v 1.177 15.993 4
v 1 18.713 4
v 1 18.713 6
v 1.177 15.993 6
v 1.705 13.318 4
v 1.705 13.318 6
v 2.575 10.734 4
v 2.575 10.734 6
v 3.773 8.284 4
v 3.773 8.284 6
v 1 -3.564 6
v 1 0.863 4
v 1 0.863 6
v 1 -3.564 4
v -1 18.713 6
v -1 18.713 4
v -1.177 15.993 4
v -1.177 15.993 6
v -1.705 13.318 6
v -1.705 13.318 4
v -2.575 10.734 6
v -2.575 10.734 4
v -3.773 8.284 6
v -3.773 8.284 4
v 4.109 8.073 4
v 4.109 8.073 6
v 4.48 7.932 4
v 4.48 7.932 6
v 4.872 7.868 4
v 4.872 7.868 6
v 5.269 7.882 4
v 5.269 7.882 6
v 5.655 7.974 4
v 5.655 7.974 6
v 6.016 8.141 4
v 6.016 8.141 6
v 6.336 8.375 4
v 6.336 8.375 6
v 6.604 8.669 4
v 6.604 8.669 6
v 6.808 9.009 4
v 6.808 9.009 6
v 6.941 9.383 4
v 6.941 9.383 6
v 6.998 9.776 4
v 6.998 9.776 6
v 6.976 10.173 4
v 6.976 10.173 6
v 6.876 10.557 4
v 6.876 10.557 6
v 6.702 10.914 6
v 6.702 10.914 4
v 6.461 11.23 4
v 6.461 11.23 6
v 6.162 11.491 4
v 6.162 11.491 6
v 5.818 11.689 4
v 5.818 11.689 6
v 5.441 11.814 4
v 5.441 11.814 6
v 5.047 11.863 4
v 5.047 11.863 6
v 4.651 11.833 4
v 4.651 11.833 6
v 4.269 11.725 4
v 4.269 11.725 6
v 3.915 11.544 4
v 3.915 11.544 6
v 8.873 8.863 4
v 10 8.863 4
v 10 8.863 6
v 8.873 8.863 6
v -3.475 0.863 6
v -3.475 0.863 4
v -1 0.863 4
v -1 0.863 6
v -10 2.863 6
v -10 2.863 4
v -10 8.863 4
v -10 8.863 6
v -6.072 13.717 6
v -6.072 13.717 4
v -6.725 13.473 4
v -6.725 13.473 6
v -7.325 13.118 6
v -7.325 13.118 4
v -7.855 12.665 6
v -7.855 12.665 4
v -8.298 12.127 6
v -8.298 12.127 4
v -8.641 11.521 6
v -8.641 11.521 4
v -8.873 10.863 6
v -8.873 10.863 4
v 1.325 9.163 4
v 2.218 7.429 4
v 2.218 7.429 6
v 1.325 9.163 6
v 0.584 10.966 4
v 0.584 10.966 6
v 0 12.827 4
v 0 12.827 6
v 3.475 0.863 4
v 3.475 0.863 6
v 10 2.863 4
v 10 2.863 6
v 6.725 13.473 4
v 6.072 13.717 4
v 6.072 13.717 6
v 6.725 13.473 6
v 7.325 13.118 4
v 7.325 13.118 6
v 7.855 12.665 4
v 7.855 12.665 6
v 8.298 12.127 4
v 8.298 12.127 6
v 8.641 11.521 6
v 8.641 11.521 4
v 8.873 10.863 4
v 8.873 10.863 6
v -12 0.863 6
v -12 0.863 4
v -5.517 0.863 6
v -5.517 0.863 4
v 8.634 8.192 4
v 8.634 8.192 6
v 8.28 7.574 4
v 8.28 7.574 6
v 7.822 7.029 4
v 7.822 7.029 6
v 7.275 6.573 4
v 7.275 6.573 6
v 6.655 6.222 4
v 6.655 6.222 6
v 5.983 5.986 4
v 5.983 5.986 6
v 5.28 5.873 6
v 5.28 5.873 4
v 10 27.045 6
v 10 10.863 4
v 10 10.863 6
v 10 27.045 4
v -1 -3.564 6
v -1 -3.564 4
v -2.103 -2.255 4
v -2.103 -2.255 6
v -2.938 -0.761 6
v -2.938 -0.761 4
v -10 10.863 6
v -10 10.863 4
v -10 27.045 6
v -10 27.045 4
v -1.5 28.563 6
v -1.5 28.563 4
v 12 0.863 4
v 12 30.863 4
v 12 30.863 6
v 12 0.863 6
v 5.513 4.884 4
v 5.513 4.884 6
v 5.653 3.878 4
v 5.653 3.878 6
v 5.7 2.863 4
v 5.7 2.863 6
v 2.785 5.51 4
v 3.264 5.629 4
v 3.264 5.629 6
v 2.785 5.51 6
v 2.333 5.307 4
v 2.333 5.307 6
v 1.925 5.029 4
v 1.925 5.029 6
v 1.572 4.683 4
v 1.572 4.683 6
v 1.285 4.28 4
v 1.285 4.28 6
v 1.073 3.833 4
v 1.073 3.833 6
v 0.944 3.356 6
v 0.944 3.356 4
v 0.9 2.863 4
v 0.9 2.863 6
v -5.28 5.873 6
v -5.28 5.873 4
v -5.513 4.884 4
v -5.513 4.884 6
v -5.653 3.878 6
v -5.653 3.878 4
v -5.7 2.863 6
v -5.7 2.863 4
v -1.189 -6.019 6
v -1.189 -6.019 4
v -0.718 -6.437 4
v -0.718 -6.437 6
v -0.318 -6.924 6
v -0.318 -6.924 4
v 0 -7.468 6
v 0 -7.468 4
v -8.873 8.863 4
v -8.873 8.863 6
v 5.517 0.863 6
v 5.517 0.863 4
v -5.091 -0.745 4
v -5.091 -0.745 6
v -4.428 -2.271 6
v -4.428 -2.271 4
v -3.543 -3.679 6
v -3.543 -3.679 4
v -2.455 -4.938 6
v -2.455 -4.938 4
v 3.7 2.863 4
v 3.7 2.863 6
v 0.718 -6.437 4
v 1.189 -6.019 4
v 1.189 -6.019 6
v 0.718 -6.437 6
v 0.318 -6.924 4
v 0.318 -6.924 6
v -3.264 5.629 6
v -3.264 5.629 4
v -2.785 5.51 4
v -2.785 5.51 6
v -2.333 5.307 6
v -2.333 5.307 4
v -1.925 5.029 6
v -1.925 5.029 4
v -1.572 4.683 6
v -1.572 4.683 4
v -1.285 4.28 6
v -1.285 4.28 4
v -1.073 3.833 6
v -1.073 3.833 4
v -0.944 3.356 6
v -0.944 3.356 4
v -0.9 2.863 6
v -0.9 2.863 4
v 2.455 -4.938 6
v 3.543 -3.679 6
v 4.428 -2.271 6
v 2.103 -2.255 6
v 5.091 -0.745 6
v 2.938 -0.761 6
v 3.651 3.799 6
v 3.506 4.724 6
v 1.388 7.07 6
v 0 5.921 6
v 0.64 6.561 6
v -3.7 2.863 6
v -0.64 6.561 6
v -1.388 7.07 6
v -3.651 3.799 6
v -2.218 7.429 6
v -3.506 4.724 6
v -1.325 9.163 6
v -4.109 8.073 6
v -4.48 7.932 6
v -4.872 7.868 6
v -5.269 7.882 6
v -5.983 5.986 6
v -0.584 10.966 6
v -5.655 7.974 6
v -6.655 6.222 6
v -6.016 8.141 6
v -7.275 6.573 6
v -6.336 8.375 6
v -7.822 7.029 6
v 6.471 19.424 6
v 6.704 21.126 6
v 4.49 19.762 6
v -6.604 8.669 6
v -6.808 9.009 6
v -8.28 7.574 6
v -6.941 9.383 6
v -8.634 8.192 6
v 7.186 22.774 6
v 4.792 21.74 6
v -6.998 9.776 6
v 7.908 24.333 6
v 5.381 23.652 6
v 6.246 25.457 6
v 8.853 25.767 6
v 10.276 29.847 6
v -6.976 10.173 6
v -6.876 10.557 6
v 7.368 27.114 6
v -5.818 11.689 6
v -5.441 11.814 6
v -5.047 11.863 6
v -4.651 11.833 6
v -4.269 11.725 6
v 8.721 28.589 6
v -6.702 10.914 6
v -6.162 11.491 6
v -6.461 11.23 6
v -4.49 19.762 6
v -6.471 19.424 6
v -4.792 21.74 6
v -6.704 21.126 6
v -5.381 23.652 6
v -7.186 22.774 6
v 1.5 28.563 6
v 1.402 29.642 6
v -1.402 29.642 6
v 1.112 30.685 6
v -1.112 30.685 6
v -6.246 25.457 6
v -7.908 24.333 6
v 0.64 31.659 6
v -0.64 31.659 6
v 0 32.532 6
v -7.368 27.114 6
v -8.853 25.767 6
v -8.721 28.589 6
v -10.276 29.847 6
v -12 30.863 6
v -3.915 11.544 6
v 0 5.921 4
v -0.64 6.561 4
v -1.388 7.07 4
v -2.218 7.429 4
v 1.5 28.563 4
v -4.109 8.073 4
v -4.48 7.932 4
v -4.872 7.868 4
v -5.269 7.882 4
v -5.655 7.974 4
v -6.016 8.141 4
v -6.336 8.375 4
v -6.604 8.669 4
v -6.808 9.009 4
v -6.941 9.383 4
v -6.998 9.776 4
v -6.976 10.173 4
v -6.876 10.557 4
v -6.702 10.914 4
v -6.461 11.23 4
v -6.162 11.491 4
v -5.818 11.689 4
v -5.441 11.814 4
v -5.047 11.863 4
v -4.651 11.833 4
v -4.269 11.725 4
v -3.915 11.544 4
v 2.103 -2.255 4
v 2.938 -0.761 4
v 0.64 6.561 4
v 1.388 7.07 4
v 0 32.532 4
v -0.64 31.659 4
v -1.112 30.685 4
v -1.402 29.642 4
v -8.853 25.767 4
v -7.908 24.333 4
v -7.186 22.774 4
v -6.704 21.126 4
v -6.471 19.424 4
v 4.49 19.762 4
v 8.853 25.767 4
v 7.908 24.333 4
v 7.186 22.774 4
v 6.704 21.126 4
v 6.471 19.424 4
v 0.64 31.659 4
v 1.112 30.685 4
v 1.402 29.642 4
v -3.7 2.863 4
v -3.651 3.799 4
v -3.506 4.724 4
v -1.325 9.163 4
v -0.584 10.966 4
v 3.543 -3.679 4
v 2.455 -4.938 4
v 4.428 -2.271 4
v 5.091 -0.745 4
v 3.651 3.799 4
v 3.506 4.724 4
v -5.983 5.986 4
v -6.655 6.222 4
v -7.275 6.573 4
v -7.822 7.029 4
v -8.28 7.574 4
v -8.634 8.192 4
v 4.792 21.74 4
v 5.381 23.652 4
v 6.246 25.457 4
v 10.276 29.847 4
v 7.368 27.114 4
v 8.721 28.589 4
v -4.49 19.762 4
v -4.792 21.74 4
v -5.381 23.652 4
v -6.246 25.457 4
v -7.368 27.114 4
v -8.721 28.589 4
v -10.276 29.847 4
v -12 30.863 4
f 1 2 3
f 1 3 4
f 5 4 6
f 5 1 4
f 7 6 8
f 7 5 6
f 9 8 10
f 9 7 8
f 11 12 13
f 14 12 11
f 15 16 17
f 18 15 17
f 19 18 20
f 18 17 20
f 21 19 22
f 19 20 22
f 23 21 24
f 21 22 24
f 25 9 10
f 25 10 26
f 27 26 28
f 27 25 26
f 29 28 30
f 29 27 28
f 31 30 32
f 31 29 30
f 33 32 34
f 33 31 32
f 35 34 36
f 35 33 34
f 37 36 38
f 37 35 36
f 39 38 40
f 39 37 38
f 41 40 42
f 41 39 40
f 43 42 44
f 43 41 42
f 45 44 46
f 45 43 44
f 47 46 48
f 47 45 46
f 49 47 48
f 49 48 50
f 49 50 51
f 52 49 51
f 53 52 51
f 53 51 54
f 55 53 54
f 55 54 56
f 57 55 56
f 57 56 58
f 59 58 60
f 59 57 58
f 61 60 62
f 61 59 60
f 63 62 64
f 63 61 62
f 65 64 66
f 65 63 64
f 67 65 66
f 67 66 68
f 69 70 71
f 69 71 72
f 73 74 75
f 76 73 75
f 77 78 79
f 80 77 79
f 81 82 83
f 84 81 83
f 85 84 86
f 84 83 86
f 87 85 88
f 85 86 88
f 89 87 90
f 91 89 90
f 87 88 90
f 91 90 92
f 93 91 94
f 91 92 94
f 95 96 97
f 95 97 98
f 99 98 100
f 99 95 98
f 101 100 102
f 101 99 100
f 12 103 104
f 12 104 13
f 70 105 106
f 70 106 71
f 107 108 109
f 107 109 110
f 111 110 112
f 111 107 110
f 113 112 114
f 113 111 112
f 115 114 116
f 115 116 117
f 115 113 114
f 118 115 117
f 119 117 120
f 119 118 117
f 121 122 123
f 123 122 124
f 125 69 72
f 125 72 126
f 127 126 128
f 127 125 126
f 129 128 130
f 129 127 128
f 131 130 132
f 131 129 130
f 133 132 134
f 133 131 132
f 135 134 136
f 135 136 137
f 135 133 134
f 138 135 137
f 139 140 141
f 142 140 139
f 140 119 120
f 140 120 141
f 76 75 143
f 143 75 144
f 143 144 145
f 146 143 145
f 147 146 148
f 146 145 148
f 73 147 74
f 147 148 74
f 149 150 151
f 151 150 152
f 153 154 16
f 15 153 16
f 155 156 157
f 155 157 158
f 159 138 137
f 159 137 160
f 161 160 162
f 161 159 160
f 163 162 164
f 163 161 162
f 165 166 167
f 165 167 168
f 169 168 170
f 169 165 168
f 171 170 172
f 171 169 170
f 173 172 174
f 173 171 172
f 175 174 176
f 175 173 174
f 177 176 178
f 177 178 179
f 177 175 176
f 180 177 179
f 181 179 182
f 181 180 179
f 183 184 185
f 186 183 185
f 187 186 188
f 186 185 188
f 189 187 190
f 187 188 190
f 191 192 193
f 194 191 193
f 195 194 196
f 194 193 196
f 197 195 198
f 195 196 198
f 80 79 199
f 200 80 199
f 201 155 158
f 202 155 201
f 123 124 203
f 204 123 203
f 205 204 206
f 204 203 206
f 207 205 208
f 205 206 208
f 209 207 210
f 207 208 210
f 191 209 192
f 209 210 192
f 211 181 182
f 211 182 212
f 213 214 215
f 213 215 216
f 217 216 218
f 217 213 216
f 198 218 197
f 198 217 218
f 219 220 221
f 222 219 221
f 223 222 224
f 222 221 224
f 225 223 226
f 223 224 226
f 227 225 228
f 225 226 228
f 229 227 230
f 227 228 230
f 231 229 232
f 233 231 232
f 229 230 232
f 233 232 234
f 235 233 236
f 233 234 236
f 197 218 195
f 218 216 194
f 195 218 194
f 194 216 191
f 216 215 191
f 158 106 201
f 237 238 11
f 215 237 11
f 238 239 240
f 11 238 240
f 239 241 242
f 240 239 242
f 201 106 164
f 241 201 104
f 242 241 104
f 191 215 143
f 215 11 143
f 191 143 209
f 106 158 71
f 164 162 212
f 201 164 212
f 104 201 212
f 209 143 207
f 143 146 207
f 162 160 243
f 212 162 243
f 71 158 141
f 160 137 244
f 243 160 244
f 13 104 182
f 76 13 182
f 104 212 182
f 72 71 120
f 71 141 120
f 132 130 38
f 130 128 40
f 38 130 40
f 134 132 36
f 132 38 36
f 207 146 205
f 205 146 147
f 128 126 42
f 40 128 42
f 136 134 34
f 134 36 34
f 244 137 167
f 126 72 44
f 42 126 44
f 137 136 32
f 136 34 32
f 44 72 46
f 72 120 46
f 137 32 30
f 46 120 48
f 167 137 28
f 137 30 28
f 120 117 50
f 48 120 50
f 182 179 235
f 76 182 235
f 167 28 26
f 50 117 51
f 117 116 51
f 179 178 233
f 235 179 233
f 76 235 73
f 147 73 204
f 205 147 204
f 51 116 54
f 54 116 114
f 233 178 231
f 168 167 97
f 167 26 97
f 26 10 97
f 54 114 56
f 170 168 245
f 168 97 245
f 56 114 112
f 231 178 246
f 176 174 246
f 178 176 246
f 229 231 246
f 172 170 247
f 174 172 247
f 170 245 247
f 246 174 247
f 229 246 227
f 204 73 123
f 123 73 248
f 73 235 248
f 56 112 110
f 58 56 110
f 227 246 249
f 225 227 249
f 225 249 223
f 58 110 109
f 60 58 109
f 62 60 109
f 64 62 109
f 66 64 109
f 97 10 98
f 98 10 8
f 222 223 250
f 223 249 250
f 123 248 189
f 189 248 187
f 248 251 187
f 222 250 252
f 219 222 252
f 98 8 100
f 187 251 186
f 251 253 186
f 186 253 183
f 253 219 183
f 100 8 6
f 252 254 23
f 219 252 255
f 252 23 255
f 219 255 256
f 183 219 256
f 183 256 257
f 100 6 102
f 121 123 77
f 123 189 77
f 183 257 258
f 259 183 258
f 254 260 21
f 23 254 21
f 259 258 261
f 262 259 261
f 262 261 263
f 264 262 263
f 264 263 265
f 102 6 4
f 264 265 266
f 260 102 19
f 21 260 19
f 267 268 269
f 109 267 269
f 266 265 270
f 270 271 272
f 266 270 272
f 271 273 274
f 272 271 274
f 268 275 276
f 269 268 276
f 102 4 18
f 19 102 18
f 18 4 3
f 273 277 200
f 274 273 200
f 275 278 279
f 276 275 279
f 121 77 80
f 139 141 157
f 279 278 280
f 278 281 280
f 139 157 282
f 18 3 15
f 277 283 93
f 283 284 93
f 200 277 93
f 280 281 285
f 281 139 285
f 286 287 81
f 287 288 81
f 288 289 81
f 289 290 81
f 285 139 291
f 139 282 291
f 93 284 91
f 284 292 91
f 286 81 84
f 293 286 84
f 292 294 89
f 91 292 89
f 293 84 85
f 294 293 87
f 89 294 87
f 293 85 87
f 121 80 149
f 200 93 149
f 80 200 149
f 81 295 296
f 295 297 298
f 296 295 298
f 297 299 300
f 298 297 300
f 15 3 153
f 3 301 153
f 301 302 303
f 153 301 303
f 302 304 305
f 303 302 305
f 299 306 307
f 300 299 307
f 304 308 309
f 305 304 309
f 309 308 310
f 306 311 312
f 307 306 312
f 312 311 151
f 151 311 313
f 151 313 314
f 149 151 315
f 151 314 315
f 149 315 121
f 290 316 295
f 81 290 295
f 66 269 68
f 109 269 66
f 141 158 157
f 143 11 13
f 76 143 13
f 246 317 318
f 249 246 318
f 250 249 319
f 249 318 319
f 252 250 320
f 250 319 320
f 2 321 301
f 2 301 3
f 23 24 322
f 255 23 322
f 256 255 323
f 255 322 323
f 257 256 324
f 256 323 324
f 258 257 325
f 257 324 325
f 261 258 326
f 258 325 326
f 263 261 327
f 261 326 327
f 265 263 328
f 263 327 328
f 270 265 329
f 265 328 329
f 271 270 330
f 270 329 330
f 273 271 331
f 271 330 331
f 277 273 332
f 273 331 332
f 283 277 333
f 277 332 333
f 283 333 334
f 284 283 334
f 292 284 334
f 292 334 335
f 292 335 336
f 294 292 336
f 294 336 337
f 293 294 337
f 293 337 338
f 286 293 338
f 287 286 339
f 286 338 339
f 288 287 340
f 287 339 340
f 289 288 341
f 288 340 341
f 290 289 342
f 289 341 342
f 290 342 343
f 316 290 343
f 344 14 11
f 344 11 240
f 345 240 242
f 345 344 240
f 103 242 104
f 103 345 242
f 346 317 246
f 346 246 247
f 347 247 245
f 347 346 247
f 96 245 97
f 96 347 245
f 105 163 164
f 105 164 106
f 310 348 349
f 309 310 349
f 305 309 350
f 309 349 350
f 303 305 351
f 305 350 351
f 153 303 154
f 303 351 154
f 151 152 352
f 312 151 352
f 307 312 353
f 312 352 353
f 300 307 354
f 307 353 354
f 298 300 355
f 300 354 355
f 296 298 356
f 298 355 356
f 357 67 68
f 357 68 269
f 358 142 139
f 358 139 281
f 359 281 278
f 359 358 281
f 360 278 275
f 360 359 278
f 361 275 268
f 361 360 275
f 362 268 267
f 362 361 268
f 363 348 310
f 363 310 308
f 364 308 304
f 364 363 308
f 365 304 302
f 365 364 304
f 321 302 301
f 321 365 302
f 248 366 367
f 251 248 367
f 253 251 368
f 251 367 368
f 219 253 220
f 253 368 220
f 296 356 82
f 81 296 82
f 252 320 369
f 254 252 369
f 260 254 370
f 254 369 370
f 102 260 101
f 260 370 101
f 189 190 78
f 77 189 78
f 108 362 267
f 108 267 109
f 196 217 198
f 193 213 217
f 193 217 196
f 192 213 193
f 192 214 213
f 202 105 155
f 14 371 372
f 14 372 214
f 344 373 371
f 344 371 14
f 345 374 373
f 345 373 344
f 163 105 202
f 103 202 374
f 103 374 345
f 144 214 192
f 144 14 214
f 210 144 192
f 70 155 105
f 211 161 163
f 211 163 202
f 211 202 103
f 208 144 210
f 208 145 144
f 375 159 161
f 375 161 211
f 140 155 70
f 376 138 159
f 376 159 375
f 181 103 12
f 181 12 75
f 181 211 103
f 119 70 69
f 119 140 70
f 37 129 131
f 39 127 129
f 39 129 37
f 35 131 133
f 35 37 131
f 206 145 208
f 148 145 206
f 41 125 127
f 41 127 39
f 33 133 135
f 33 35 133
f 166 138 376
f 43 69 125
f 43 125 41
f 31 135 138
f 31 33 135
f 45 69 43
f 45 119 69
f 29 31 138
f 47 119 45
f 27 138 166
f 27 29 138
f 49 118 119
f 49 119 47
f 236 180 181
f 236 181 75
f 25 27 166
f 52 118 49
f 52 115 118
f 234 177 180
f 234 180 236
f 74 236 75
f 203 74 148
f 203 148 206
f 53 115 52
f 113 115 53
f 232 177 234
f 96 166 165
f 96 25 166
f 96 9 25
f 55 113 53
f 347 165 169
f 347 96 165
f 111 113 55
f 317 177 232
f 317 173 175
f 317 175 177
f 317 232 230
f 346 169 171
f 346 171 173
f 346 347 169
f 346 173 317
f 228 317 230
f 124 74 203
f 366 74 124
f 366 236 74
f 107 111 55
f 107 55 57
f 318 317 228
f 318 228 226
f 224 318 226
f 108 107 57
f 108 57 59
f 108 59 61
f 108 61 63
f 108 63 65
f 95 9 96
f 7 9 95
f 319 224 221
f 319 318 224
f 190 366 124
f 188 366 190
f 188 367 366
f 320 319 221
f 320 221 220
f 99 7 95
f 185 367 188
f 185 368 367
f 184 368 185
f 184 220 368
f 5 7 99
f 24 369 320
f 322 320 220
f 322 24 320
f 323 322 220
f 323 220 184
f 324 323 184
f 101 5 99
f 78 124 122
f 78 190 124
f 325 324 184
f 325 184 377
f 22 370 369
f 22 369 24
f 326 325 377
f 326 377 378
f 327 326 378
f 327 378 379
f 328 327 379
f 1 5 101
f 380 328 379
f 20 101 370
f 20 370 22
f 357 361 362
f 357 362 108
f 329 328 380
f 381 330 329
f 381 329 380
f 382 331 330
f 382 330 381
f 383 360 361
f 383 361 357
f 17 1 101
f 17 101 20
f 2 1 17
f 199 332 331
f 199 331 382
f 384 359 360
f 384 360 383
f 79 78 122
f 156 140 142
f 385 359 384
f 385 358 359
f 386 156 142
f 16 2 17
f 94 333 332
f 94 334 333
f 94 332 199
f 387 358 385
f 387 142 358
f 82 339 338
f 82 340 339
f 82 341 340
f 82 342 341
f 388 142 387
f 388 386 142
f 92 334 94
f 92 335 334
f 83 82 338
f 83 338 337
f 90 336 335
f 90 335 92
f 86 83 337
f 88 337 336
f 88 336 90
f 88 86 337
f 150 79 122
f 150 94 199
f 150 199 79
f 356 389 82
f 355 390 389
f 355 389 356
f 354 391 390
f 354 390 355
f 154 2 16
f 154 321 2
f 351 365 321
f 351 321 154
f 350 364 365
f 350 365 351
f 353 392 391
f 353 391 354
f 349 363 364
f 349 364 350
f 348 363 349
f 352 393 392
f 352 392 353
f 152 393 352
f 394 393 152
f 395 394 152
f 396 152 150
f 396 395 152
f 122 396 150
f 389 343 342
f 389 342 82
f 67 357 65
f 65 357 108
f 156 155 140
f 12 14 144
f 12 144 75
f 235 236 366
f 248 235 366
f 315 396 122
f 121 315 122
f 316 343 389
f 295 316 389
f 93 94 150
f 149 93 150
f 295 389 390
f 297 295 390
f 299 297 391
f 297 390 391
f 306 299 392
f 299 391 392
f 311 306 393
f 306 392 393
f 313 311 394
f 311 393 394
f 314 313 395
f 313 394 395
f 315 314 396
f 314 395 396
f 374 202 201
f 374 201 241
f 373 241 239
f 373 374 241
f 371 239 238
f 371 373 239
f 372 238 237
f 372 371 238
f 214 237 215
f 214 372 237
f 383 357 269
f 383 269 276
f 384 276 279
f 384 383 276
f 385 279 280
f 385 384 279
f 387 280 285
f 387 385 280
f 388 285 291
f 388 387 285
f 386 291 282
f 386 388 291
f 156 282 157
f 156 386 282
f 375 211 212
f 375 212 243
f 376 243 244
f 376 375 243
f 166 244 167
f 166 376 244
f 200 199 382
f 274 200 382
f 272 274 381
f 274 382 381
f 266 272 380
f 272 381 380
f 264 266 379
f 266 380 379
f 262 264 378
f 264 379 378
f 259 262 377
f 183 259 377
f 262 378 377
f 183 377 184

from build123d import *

# Parameters (mm, degrees)
EXTRUDE_1_DEPTH = 10
SCALE_1_SCALE   = 0.2


with BuildPart() as part:
    # Эскиз1 → Бобышка-Вытянуть1 (new body)
    with BuildSketch(Plane.XY):
        with BuildLine():
            Line((-60, -45), (-27.583269132, -45))
            ThreePointArc((-27.583269132, -45), (-20.06001769, -64.277376125), (-5.945767968, -79.41027067))
            ThreePointArc((-5.945767968, -79.41027067), (-2.542345747, -82.680315027), (0, -86.656865167))
            Line((0, -86.656865167), (0, -19.711115149))
            ThreePointArc((0, -19.711115149), (-5.008387109, -15.151161707), (-11.091351129, -12.172124017))
            ThreePointArc((-11.091351129, -12.172124017), (-4.677676581, 0.965070873), (0, 14.815718966))
            Line((0, 14.815718966), (0, 113.343134833))
            ThreePointArc((0, 113.343134833), (-5.562430401, 104.106601718), (-7.5, 93.5))
            Line((-7.5, 93.5), (-5, 44.25))
            ThreePointArc((-5, 44.25), (-8.525159088, 17.271181236), (-18.863936417, -7.896120801))
            ThreePointArc((-18.863936417, -7.896120801), (-34.990467135, -0.436539144), (-19.576058944, 8.401241779))
            Line((-19.576058944, 8.401241779), (-22.449472465, 49.49296956))
            ThreePointArc((-22.449472465, 49.49296956), (-33.881518529, 82.214174393), (-60, 105))
            Line((-60, 105), (-60, -45))
        make_face()
        with BuildLine():
            ThreePointArc((-26.401072965, -19.950864506), (-27.972740949, -27.40259956), (-28.5, -35))
            Line((-28.5, -35), (-50, -35))
            Line((-50, -35), (-50, -5))
            Line((-50, -5), (-44.364916731, -5))
            ThreePointArc((-44.364916731, -5), (-37.794087282, -15.372421104), (-26.401072965, -19.950864506))
        make_face(mode=Mode.SUBTRACT)
        with BuildLine():
            Line((-5, -45), (-5, -67.136427928))
            ThreePointArc((-5, -67.136427928), (-12.779082294, -56.957998409), (-17.374821937, -45))
            Line((-17.374821937, -45), (-5, -45))
        make_face(mode=Mode.SUBTRACT)
        with BuildLine():
            Line((-4.5, -35), (-18.5, -35))
            ThreePointArc((-18.5, -35), (-17.952221542, -28), (-16.322222222, -21.170419965))
            ThreePointArc((-16.322222222, -21.170419965), (-7.858362699, -25.902991945), (-4.5, -35))
        make_face(mode=Mode.SUBTRACT)
        with BuildLine():
            Line((-44.364916731, 5), (-50, 5))
            Line((-50, 5), (-50, 85.909197079))
            ThreePointArc((-50, 85.909197079), (-37.591425702, 68.515820434), (-32.355603325, 47.801370616))
            Line((-32.355603325, 47.801370616), (-30.360374841, 19.268273964))
            ThreePointArc((-30.360374841, 19.268273964), (-39.273434111, 14.009606657), (-44.364916731, 5))
        make_face(mode=Mode.SUBTRACT)
    extrude_1 = extrude(amount=EXTRUDE_1_DEPTH)

    # Зеркальное отражение1: Бобышка-Вытянуть1 across plane
    add(extrude_1.mirror(Plane(origin=(0, 0, 0), x_dir=(0, 0, 1), z_dir=(1, 0, 0))))


with BuildPart() as part_1:
    # Масштаб1: scaled about (0, 12.329369983, 5)
    add(part.part.scale(SCALE_1_SCALE).moved(Location((0, 9.863495986, 4))))


solid = part_1.part
